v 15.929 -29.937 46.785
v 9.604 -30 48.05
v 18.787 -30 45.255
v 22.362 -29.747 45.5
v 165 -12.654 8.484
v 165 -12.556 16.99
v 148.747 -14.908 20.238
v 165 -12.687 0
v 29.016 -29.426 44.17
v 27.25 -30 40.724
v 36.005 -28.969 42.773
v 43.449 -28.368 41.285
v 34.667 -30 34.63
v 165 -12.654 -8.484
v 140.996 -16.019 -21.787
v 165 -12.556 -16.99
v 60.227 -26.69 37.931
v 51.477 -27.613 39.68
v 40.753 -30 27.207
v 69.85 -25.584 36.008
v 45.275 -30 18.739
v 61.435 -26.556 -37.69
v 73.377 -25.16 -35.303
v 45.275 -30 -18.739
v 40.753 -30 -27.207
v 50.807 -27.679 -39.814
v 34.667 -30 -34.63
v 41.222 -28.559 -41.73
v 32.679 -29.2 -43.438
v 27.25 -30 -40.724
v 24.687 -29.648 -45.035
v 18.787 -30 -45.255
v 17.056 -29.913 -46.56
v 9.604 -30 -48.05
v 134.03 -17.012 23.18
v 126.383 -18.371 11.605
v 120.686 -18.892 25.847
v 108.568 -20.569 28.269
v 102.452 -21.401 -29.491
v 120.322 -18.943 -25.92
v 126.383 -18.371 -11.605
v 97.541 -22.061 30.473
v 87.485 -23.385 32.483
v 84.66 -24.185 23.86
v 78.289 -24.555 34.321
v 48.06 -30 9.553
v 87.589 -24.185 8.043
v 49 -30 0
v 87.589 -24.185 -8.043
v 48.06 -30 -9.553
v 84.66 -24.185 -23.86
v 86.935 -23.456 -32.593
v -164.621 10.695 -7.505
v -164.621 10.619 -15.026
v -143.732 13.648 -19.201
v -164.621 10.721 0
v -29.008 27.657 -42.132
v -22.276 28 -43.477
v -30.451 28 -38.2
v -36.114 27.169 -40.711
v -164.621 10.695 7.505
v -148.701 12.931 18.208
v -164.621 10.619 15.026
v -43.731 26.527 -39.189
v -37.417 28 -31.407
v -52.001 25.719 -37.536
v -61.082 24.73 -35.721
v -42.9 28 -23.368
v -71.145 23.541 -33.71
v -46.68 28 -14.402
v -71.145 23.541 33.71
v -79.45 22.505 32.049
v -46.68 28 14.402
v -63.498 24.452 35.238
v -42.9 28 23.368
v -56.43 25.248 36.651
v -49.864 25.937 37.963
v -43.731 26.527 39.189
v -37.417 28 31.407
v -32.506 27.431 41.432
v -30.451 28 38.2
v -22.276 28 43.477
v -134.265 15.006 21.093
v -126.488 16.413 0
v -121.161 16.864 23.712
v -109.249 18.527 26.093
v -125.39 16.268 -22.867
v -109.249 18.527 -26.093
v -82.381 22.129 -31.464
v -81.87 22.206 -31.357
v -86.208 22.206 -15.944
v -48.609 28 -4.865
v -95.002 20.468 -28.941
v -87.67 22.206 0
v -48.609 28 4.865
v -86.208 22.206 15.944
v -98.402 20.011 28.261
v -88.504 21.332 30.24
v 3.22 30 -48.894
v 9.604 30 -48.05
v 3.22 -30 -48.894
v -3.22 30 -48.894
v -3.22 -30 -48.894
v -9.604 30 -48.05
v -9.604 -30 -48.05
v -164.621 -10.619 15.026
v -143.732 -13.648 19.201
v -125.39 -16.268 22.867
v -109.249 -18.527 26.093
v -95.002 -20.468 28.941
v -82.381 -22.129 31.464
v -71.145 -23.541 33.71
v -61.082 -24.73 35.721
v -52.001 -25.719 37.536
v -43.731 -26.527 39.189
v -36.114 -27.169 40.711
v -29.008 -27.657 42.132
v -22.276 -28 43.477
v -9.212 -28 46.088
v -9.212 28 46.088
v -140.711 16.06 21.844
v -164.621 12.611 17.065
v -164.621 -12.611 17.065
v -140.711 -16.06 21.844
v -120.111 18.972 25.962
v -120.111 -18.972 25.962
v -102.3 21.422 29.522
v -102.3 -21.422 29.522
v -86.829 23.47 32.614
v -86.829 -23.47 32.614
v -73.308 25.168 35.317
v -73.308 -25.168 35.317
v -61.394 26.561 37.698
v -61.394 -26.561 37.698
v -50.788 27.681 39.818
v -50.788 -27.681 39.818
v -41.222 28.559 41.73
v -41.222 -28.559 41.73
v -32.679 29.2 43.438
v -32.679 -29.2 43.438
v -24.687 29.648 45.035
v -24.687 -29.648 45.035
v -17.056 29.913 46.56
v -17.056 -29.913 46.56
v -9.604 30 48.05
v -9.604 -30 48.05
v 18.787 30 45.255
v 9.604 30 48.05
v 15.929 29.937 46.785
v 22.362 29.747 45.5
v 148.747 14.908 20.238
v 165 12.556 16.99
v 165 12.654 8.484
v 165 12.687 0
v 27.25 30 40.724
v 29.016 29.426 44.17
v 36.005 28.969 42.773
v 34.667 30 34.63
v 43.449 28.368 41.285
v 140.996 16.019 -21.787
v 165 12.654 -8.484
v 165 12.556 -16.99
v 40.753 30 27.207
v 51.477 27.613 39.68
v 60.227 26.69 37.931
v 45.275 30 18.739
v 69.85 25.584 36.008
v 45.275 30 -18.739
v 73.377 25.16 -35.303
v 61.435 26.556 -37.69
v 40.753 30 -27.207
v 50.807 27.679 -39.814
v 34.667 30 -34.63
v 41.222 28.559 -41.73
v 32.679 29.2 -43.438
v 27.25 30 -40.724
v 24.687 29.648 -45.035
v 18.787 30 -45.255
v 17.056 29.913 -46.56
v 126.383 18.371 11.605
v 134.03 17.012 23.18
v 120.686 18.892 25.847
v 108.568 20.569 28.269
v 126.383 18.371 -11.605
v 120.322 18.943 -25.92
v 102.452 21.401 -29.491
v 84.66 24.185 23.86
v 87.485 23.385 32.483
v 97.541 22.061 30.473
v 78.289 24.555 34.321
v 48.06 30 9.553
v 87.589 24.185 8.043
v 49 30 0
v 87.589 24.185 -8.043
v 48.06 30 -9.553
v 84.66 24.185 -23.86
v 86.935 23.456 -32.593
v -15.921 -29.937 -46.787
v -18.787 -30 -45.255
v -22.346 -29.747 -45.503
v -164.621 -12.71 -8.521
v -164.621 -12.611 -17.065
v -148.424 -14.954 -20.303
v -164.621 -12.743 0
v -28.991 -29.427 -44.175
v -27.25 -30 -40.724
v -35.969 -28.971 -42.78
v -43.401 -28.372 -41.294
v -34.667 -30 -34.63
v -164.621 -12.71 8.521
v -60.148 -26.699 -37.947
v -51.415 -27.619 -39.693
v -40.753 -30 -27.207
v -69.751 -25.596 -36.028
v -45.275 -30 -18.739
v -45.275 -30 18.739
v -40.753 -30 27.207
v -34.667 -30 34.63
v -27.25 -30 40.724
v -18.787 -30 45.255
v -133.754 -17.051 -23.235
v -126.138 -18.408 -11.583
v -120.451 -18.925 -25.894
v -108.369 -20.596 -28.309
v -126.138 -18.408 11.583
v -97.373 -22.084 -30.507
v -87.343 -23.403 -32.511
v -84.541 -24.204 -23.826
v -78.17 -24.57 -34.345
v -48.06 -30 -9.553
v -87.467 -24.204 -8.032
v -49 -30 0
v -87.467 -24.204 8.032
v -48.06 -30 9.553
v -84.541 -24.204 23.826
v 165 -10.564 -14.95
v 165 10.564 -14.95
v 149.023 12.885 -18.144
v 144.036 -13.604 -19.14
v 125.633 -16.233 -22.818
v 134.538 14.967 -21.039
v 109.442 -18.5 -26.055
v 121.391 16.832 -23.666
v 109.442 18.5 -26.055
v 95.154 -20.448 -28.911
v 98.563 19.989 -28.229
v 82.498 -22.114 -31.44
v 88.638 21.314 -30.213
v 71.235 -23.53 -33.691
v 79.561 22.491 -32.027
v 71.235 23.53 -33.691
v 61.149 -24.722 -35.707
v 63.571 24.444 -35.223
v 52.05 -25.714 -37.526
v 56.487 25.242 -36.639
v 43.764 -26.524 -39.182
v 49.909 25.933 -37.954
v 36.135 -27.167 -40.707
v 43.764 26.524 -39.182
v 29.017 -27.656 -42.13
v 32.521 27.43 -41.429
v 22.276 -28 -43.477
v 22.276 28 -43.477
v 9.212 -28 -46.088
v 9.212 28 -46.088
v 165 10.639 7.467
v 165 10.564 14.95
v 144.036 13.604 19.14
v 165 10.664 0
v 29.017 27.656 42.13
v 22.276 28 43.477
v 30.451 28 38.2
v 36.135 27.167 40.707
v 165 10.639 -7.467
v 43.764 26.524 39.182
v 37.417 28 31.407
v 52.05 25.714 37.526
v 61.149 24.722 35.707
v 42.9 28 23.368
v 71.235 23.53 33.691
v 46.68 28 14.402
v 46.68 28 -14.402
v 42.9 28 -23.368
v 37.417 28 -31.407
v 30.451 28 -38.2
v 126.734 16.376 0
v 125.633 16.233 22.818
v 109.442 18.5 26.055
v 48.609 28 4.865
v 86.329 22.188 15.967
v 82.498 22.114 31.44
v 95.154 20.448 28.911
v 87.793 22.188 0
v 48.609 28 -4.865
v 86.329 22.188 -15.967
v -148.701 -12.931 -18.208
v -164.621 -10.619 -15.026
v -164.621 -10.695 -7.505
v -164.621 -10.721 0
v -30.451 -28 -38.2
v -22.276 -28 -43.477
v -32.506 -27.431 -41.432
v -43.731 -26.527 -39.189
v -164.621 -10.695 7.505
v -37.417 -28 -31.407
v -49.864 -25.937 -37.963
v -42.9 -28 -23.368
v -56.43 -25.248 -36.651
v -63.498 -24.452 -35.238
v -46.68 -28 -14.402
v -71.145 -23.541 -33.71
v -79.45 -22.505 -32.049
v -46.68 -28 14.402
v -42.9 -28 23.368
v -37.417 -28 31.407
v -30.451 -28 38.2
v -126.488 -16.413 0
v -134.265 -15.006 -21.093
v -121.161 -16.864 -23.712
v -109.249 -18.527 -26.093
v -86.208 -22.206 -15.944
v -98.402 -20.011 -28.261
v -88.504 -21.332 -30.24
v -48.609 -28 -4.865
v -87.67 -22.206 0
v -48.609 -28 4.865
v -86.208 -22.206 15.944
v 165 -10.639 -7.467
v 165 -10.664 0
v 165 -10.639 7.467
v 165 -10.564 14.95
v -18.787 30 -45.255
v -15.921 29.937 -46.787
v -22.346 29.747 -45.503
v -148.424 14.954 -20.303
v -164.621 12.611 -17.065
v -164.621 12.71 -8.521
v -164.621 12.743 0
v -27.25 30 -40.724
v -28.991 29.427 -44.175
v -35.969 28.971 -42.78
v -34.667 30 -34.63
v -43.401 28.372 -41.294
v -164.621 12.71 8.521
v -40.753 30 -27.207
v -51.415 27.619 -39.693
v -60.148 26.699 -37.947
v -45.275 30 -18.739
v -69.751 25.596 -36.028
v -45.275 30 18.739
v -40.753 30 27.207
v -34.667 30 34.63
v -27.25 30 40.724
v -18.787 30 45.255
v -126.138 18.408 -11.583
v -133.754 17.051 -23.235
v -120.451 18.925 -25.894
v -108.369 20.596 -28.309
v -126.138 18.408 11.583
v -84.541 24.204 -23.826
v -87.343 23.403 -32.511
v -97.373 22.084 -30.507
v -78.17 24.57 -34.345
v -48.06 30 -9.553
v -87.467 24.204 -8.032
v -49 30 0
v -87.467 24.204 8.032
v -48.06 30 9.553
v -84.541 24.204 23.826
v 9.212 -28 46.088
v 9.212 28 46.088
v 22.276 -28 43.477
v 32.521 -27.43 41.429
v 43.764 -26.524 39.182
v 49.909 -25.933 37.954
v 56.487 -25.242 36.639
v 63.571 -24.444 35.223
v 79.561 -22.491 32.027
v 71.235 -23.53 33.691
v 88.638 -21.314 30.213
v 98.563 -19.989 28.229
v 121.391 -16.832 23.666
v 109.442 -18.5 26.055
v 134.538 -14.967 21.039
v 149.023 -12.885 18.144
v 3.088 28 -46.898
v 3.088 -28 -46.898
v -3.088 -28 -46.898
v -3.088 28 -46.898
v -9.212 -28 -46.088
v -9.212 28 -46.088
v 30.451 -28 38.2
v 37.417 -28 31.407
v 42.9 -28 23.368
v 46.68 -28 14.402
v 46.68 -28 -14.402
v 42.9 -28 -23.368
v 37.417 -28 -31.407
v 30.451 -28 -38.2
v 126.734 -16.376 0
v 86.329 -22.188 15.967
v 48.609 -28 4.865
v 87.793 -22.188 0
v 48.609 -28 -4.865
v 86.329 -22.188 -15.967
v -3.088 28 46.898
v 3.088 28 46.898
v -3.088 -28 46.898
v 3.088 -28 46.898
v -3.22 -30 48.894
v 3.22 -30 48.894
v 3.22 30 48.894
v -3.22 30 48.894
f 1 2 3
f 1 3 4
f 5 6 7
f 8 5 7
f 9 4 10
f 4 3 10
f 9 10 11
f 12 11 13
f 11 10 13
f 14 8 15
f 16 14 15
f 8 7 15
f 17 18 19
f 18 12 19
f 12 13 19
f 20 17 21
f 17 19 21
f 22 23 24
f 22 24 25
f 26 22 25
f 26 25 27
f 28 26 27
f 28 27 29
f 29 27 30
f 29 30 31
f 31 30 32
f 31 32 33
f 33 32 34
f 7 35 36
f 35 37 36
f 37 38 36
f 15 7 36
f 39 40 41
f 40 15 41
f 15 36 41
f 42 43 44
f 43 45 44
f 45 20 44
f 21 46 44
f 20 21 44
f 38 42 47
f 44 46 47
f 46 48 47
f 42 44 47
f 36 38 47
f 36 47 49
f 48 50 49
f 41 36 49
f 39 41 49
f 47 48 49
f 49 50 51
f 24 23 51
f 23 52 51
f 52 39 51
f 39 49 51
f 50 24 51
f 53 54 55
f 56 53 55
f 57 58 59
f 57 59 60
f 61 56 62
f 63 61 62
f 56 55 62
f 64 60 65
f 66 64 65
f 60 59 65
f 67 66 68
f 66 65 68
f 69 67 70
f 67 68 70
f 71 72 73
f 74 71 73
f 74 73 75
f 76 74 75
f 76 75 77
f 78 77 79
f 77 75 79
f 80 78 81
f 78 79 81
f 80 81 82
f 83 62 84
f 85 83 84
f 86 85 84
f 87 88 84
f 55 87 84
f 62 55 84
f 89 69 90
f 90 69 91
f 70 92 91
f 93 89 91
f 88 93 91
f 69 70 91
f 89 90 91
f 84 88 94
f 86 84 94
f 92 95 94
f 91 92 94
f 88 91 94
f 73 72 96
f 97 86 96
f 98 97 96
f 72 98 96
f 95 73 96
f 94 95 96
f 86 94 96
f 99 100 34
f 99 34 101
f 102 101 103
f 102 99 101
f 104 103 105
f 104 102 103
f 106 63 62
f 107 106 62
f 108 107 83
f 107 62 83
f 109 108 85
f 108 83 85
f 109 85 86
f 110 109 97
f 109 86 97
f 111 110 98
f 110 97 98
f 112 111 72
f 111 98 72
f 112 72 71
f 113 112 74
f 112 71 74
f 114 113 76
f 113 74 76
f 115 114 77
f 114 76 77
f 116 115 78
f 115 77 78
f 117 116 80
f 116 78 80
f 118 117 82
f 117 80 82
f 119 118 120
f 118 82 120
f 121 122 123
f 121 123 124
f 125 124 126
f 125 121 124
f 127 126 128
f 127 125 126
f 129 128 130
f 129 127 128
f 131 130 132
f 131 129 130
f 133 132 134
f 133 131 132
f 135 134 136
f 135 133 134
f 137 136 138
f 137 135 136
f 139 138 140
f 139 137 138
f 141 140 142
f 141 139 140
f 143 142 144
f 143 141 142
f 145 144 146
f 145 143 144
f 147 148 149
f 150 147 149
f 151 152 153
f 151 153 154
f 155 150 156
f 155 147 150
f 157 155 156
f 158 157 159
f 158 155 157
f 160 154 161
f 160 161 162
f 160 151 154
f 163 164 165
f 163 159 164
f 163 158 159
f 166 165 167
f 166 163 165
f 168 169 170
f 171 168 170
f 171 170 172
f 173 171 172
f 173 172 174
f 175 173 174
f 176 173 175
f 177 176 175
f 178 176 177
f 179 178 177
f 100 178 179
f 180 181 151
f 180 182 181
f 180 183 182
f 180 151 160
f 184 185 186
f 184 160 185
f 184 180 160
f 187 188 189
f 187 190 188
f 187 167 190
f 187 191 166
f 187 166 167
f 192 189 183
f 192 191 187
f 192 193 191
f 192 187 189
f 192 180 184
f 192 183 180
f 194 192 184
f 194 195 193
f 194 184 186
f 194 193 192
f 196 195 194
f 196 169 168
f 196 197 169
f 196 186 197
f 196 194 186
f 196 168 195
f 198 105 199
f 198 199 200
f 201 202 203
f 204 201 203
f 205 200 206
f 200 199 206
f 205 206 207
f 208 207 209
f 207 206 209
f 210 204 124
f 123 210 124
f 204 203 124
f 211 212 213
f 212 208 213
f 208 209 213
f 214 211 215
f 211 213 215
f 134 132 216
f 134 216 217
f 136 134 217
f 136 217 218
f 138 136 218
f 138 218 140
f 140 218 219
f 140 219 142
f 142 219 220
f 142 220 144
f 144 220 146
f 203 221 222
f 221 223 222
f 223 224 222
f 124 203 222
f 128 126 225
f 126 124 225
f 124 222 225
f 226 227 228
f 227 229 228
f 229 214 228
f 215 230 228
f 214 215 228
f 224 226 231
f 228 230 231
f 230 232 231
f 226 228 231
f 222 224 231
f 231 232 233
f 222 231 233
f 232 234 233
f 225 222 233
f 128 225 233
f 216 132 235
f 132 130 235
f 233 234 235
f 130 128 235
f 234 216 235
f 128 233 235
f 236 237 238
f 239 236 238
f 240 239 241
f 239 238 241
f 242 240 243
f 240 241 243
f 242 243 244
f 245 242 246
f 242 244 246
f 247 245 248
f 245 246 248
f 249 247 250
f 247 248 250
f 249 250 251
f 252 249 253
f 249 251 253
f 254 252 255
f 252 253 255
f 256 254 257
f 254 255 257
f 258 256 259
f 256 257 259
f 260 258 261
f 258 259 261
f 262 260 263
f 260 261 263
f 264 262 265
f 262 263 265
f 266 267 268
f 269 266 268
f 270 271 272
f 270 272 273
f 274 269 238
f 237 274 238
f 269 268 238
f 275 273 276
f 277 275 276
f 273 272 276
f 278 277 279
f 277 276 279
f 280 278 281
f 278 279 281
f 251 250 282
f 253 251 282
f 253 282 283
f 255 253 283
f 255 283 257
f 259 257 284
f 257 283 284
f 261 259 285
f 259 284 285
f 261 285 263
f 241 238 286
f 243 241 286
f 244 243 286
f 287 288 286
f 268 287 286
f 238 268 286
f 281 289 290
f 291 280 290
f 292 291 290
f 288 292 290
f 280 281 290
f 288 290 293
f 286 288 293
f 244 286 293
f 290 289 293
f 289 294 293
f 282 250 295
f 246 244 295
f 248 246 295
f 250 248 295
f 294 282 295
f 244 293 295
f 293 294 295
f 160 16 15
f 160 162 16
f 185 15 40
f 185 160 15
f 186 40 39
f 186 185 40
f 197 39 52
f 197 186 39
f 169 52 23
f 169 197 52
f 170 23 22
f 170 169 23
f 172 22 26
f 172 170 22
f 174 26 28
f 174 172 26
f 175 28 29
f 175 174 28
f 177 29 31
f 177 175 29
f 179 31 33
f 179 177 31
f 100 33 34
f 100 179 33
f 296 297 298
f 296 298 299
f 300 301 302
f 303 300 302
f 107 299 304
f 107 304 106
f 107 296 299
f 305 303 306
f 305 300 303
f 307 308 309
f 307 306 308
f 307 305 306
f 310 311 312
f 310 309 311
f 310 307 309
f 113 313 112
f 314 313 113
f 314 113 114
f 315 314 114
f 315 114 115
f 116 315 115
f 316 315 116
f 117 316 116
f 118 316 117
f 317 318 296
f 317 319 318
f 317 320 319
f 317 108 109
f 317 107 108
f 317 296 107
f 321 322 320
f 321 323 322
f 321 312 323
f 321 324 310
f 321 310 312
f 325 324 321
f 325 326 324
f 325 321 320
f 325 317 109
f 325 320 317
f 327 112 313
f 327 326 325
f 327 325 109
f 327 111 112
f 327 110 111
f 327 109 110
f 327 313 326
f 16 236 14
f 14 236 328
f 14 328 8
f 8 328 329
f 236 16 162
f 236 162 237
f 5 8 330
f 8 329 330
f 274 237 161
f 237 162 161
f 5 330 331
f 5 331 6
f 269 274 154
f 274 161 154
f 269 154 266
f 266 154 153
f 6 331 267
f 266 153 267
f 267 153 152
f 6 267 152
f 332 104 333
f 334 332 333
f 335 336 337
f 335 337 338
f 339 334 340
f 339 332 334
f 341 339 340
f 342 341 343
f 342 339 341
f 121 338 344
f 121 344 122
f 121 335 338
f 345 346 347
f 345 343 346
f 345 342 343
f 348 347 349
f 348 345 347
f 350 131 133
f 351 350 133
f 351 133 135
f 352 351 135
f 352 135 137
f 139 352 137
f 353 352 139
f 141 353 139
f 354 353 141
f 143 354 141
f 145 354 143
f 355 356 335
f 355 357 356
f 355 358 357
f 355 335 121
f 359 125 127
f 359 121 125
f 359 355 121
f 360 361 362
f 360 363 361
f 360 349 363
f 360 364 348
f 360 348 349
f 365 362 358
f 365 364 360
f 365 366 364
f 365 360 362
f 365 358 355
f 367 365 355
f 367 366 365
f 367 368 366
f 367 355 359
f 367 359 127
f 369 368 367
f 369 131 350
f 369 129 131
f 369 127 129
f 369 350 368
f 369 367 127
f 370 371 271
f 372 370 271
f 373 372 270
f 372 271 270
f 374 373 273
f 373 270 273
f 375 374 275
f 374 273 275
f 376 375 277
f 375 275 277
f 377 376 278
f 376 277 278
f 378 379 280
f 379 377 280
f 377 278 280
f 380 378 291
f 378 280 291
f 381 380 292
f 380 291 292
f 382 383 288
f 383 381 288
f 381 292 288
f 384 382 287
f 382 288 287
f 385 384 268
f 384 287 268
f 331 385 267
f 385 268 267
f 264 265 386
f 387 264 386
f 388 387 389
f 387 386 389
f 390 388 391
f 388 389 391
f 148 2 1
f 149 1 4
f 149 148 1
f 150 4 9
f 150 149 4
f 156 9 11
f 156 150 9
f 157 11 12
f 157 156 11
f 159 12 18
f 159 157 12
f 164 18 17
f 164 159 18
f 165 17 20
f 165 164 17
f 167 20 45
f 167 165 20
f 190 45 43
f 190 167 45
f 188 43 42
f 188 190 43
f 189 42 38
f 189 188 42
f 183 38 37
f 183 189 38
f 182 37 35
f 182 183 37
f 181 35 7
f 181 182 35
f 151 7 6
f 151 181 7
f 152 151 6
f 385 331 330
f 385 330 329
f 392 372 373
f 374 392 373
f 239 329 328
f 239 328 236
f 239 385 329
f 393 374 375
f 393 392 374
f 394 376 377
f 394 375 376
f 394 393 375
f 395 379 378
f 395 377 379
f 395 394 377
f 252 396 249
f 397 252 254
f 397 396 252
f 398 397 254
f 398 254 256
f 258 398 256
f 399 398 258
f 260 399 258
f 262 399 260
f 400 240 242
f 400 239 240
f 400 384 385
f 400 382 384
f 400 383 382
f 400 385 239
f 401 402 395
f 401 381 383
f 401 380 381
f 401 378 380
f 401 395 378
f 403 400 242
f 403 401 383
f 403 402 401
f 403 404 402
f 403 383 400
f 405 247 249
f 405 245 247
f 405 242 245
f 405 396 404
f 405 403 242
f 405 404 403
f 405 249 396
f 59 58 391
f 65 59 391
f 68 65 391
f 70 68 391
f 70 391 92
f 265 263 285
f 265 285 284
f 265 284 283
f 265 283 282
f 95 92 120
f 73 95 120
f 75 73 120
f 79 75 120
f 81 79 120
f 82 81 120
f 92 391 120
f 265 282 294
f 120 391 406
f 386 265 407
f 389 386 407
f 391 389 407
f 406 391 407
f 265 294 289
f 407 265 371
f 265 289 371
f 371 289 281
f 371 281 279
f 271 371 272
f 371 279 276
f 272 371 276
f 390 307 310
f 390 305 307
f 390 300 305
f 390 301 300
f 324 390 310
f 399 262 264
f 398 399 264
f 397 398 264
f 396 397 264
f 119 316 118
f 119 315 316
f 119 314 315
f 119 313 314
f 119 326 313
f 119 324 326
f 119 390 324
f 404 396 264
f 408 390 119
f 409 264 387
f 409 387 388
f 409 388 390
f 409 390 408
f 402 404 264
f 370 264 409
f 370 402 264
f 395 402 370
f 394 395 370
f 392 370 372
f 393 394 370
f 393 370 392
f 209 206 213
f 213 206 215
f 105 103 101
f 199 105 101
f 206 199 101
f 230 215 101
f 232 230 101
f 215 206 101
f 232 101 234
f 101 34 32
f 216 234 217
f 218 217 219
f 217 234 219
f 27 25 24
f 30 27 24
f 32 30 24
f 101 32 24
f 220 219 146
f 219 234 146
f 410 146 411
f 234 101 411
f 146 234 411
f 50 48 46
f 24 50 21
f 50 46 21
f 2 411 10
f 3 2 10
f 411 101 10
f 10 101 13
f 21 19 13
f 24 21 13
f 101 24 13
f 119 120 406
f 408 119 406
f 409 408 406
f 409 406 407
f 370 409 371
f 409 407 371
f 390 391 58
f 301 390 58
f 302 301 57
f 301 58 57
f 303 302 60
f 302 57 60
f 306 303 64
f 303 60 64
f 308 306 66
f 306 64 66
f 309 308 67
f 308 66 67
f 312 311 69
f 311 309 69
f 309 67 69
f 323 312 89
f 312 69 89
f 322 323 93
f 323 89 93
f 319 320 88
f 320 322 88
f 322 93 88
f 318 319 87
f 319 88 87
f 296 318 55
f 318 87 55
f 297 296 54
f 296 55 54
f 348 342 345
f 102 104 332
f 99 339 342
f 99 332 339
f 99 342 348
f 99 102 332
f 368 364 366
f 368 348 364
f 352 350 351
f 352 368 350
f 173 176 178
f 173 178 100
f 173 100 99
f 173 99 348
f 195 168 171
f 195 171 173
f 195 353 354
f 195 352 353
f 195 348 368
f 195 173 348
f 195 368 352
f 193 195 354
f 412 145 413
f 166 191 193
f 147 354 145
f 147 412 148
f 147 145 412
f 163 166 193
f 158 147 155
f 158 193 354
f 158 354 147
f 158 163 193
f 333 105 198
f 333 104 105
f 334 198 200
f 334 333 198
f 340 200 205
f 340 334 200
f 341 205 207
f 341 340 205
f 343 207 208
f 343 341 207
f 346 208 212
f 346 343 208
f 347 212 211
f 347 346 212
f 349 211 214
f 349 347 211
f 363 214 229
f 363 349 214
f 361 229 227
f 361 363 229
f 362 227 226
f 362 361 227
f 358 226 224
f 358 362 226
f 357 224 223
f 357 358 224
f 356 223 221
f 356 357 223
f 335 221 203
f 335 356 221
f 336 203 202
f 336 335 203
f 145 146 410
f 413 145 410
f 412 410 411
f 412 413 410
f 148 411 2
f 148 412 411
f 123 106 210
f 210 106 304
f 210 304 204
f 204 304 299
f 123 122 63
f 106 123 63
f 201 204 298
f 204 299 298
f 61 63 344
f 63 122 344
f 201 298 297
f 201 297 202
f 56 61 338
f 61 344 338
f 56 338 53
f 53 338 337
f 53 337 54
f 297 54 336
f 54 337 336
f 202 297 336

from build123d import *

# Parameters (mm, degrees)
SKETCH_1_R               = 49
EXTRUDE_1_DEPTH          = 30
SKETCH_16_R              = 250
SKETCH_16_5_R            = 250
SKETCH_14_OUTSIDE_W      = 643.93
SKETCH_14_OUTSIDE_H      = 643.93
CUT_EXTRUDE_1_DEPTH      = 355.823900134
CUT_EXTRUDE_1_DEPTH_BACK = 355.823900134
SHELL_1_T                = 2
SKETCH_15_OUTSIDE_W      = 604.606
SKETCH_15_OUTSIDE_H      = 202.606
CUT_EXTRUDE_2_DEPTH      = 257.517055963
CUT_EXTRUDE_2_DEPTH_BACK = 257.517055963


with BuildPart() as part:
    # 草图1 → 凸台-拉伸1 (new, symmetric)
    with BuildSketch(Plane(origin=(0, 0, 0), x_dir=(1, 0, 0), z_dir=(0, 1, 0))):
        with Locations(Location((0, 0, 0), (0, 0, 270))):
            Circle(SKETCH_1_R)
    extrude(amount=EXTRUDE_1_DEPTH, both=True)

    # 草图16 → section 0 of loft_1
    with BuildSketch(Plane(origin=(0, 0, 0), x_dir=(1, 0, 0), z_dir=(0, 1, 0)), mode=Mode.PRIVATE) as loft_1_s0:
        Circle(SKETCH_16_R)
    # loft up to a face of the part (loft_1)
    loft([loft_1_s0.sketch, Face(Wire([part.edges().sort_by_distance((35.719462744, 30, -33.542808191))[0]]))])

    # 草图16<5> → section 0 of loft_3
    with BuildSketch(Plane(origin=(0, 0, 0), x_dir=(1, 0, 0), z_dir=(0, 1, 0)), mode=Mode.PRIVATE) as loft_3_s0:
        Circle(SKETCH_16_5_R)
    # loft up to a face of the part (loft_3)
    loft([loft_3_s0.sketch, Face(Wire([part.edges().sort_by_distance((-35.719462744, -30, -33.542808191))[0]]))])

    # 草图14 outside → 切除-拉伸1 (cut, two sides)
    with BuildSketch(Plane(origin=(0, 0, 0), x_dir=(1, 0, 0), z_dir=(0, 1, 0))) as cut_extrude_1_sk:
        Rectangle(SKETCH_14_OUTSIDE_W, SKETCH_14_OUTSIDE_H)
        with BuildLine():
            Line((-250, 0), (-9.604, -48.049590883))
            ThreePointArc((-9.604, -48.049590883), (0, -49), (9.604, -48.049590883))
            Line((9.604, -48.049590883), (250, 0))
            Line((250, 0), (9.604, 48.049590883))
            ThreePointArc((9.604, 48.049590883), (1.6e-08, 49), (-9.603999968, 48.049590889))
            Line((-9.603999968, 48.049590889), (-250, 0))
        make_face(mode=Mode.SUBTRACT)
    extrude(amount=CUT_EXTRUDE_1_DEPTH, mode=Mode.SUBTRACT)
    extrude(cut_extrude_1_sk.sketch, amount=-CUT_EXTRUDE_1_DEPTH_BACK, mode=Mode.SUBTRACT)

    # 抽壳1 (no face opened: a closed hollow body)
    add(offset(amount=-SHELL_1_T, mode=Mode.PRIVATE), mode=Mode.SUBTRACT)

    # 草图15 outside → 切除-拉伸2 (cut, two sides)
    with BuildSketch(Plane(origin=(0, 0, 0), x_dir=(1, 0, 0), z_dir=(0, 1, 0))) as cut_extrude_2_sk:
        Rectangle(SKETCH_15_OUTSIDE_W, SKETCH_15_OUTSIDE_H)
        with BuildLine():
            Line((-9.60400022, -48.049590839), (-164.621347882, -17.065214498))
            Line((-164.621347882, -17.065214498), (-164.621347882, 17.065214498))
            Line((-164.621347882, 17.065214498), (-9.604, 48.049590883))
            ThreePointArc((-9.604, 48.049590883), (0, 49), (9.604, 48.049590883))
            Line((9.604, 48.049590883), (165, 16.989530712))
            Line((165, 16.989530712), (165, -16.989530712))
            Line((165, -16.989530712), (9.604, -48.049590883))
            ThreePointArc((9.604, -48.049590883), (-1.12e-07, -49), (-9.60400022, -48.049590839))
        make_face(mode=Mode.SUBTRACT)
    extrude(amount=CUT_EXTRUDE_2_DEPTH, mode=Mode.SUBTRACT)
    extrude(cut_extrude_2_sk.sketch, amount=-CUT_EXTRUDE_2_DEPTH_BACK, mode=Mode.SUBTRACT)


solid = part.part
